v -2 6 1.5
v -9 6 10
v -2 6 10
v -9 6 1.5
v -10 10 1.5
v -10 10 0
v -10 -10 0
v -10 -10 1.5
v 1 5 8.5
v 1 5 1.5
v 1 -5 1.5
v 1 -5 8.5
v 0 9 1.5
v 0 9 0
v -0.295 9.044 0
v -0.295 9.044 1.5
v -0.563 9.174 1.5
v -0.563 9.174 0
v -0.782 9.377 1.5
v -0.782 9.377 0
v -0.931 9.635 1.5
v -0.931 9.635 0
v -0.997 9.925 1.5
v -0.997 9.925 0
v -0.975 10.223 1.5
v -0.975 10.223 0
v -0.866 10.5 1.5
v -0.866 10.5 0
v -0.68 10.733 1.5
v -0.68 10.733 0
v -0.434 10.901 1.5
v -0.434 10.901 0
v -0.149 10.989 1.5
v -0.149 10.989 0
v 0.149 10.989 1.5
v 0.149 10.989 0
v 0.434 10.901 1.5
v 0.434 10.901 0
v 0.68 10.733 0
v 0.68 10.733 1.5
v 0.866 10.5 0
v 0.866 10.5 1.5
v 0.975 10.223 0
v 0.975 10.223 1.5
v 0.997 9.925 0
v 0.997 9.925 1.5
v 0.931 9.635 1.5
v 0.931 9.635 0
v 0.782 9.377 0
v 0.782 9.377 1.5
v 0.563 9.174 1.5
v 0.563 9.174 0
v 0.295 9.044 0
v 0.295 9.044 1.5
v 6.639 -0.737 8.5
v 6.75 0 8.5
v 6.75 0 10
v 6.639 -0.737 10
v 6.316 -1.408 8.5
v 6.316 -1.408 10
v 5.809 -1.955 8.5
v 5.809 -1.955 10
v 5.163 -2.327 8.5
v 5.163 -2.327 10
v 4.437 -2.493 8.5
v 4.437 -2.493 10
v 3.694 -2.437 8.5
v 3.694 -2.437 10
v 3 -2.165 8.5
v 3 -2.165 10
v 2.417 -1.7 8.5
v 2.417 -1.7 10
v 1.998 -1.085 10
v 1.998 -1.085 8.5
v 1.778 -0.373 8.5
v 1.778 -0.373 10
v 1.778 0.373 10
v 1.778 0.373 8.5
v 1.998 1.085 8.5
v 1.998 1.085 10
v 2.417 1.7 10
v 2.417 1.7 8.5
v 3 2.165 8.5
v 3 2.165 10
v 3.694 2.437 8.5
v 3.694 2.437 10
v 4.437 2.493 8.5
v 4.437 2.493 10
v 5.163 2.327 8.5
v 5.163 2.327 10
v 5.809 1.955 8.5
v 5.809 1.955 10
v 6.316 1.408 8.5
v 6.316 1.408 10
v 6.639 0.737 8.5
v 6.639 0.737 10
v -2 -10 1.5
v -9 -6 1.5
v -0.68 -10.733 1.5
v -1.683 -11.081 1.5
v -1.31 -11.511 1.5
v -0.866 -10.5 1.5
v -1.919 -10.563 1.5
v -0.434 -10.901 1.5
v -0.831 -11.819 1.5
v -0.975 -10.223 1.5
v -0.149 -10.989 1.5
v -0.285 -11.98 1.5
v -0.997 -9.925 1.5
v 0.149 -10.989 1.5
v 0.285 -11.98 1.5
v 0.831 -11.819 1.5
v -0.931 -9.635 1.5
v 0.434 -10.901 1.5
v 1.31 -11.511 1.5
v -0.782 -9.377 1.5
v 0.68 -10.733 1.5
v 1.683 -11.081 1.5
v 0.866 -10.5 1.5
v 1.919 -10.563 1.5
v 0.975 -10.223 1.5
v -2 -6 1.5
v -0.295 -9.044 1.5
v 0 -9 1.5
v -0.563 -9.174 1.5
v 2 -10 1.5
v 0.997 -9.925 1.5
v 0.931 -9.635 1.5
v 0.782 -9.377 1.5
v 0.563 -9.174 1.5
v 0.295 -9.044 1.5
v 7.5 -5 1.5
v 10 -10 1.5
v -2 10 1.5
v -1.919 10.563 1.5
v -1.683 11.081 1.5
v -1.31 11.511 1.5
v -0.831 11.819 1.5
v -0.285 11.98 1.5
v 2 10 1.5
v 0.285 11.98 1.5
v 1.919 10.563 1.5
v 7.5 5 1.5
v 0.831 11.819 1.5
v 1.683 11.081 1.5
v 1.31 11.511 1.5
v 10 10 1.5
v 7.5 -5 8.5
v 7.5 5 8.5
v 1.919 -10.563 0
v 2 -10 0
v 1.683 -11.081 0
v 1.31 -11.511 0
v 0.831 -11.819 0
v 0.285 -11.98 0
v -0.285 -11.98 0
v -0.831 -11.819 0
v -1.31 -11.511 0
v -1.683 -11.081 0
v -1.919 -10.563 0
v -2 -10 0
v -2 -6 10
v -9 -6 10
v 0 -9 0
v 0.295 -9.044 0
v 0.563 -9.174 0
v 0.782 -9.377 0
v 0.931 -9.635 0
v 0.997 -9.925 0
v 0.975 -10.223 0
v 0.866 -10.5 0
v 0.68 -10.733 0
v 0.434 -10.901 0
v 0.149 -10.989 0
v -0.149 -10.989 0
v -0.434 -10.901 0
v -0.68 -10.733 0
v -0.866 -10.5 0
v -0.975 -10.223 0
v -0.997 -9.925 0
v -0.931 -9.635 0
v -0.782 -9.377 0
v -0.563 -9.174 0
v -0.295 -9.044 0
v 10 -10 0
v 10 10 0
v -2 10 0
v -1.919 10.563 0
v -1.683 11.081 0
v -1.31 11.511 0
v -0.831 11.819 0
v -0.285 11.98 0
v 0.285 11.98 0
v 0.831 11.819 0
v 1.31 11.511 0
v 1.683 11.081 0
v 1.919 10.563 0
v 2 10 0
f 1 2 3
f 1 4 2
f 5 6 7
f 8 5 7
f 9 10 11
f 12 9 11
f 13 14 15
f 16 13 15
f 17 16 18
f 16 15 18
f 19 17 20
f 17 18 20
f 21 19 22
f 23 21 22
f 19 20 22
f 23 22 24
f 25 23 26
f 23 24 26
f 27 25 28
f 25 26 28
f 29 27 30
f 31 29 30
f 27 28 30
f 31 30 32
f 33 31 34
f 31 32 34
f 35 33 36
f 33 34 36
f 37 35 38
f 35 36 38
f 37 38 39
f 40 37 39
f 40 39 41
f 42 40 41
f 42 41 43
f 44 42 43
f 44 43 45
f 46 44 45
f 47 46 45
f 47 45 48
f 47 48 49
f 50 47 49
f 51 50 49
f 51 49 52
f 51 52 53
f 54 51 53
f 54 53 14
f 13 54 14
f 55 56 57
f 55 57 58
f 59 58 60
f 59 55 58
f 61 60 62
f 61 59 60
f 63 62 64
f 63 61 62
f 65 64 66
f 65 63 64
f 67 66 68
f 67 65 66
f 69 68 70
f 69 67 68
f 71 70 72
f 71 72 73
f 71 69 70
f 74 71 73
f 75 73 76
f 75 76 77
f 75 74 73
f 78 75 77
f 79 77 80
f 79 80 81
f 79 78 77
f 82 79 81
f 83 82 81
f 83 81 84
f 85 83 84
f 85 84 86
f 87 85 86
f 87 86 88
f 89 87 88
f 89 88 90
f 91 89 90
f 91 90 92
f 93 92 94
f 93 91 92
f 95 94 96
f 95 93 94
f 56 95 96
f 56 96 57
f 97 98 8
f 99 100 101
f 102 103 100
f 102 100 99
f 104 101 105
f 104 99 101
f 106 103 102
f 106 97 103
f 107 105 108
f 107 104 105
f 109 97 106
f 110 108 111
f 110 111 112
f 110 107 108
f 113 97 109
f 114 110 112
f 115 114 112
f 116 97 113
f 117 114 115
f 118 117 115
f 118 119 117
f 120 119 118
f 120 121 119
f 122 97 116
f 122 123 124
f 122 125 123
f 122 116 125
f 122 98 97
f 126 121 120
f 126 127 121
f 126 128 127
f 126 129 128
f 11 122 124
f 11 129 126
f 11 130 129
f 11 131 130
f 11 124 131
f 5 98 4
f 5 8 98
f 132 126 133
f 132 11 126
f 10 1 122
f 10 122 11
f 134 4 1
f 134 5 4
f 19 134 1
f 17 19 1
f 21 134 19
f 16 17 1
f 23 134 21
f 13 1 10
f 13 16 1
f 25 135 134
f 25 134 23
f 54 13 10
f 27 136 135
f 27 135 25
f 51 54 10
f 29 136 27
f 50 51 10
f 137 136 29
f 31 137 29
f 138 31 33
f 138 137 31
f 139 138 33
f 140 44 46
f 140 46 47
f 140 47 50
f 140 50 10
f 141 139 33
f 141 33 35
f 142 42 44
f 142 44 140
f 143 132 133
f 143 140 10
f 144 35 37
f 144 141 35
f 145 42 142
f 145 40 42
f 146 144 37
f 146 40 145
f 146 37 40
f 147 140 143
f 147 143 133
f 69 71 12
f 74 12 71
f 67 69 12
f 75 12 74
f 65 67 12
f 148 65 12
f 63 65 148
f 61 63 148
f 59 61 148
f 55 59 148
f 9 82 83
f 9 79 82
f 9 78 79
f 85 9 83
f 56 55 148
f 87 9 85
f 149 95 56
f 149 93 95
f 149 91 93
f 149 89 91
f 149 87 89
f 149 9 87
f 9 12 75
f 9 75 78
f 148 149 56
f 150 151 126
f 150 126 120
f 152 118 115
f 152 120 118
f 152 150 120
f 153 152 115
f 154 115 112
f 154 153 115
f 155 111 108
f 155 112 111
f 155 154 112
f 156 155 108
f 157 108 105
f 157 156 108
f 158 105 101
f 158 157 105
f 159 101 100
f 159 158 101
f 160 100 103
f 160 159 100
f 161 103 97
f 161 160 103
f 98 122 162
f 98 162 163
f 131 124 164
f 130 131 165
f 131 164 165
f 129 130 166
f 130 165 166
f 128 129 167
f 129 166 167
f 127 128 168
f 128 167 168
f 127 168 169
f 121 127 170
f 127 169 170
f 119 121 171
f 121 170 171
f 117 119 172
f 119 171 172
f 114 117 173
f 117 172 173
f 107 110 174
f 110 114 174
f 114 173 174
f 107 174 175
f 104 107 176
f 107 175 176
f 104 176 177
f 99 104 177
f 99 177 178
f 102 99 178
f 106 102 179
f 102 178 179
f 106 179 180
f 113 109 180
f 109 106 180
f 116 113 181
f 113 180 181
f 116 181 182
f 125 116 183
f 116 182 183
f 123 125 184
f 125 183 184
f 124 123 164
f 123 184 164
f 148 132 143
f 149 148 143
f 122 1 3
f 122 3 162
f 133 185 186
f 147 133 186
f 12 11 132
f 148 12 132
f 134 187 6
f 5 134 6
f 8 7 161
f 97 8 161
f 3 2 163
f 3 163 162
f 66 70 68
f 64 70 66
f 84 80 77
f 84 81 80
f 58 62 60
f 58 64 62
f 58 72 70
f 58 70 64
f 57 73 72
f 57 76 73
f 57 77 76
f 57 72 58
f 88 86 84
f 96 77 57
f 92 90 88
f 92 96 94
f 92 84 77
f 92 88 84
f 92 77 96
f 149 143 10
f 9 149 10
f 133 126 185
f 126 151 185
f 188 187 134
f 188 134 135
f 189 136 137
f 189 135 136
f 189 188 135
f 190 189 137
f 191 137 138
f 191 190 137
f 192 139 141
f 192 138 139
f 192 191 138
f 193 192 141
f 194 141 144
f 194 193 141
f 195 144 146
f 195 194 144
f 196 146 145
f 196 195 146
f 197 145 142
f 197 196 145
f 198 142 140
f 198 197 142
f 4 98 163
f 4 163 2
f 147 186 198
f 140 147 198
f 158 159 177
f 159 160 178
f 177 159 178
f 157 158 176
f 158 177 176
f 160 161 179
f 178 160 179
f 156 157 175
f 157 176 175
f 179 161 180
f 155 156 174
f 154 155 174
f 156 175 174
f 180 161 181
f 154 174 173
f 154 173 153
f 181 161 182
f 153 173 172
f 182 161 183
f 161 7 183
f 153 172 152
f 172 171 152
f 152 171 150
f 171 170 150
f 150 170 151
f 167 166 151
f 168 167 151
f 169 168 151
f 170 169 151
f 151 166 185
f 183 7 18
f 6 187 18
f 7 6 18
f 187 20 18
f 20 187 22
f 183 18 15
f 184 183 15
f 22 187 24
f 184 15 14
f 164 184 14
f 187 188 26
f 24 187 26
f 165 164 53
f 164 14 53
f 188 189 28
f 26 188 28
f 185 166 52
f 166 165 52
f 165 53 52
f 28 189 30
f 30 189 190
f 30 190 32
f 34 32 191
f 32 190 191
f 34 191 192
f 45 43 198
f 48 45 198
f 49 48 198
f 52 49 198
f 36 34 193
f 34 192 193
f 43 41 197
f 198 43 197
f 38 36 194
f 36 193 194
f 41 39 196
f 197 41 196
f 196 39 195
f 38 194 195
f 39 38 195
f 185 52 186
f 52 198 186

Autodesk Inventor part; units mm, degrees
ref_plane "YZ Plane" through (0, 0, 0) normal (1, 0, 0) x (0, 1, 0)
ref_plane "XZ Plane" through (0, 0, 0) normal (0, 1, 0) x (-1, 0, 0)
ref_plane "XY Plane" through (0, 0, 0) normal (0, 0, 1) x (1, 0, 0)
sketch "Sketch1" plane through (0, 0, 0) normal (0, 0, 1) x (1, 0, 0)
  line L0 (-10, -10) -> (10, -10)
  line L1 (10, -10) -> (10, 10)
  line L2 (10, 10) -> (-10, 10)
  line L3 (-10, 10) -> (-10, -10)
  line L4 (-10, -10) -> (10, 10) construction
  line L5 (10, -10) -> (-10, 10) construction
  arc A0 (2, 10) -> (-2, 10) centre (0, 10) ccw
  arc A1 (-2, -10) -> (2, -10) centre (0, -10) ccw
  point P0 (0, 0)
  dimension "d0" = 20
  dimension "d1" = 20
  dimension "d4" = 4
  dimension "d5" = 4
extrude "Extrusion1" add sketch "Sketch1" along normal blind 1.5
sketch "Sketch2" plane through (0, 0, 1.5) normal (0, 0, 1) x (1, 0, 0)
  arc A0 (2, 10) -> (-2, 10) centre (0, 10) ccw projected
  point P0 (0, 0)
hole "Hole1" at (0, 10, 1.5) direction (0, 0, -1) diameter 2 end through all
mirror "Mirror1" about plane through (0, 0, 0) normal (0, 1, 0) of "Hole1"
sketch "Sketch3" plane through (0, 0, 1.5) normal (0, 0, 1) x (1, 0, 0)
  line L0 (1, -5) -> (7.5, -5)
  line L1 (7.5, -5) -> (7.5, 5)
  line L2 (7.5, 5) -> (1, 5)
  line L3 (1, 5) -> (1, -5)
  line L4 (1, -5) -> (7.5, 5) construction
  line L5 (7.5, -5) -> (1, 5) construction
  circle A0 centre (0, 10) radius 1 projected
  line L6 (1, 10) -> (1, 0) construction
  circle A1 centre (0, 10) radius 1 projected
  line L7 (10, -10) -> (10, 10) projected
  line L8 (-14, 0) -> (14, 0) projected
  point P0 (0, 0)
  point P1 (4.25, 0)
  point P2 (4.25, 0)
  dimension "d13" = 2.5
  dimension "d14" = 10
extrude "Extrusion2" add sketch "Sketch3" along normal blind 7 contours L3 L8 L1 L0 | L3 L2 L1 L8
sketch "Sketch4" plane through (0, 0, 8.5) normal (0, 0, 1) x (1, 0, 0)
  circle A0 centre (4.25, 0) radius 2.5
  line L0 (-14, 0) -> (14, 0) projected
  line L1 (7.5, 5) -> (1, 5) projected
  line L2 (4.25, 5) -> (4.25, 0) construction
  point P0 (0, 0)
  dimension "d17" = 5
extrude "Extrusion3" add sketch "Sketch4" along normal blind 1.5
sketch "Sketch5" plane through (0, 0, 1.5) normal (0, 0, 1) x (1, 0, 0)
  line L0 (-9, 6) -> (-2, 6)
  line L1 (-2, 6) -> (-2, -6)
  line L2 (-2, -6) -> (-9, -6)
  line L3 (-9, -6) -> (-9, 6)
  line L4 (-9, 6) -> (-2, -6) construction
  line L5 (-2, 6) -> (-9, -6) construction
  line L6 (-26.8178, 0) -> (16.1363, 0) projected
  line L7 (-10, 10) -> (-10, -10) projected
  point P0 (0, 0)
  point P1 (-5.5, 0)
  point P2 (-5.5, 0)
  dimension "d20" = 7
  dimension "d21" = 12
  dimension "d22" = 1
extrude "Extrusion4" add sketch "Sketch5" along normal blind 8.5
properties part number "button"
